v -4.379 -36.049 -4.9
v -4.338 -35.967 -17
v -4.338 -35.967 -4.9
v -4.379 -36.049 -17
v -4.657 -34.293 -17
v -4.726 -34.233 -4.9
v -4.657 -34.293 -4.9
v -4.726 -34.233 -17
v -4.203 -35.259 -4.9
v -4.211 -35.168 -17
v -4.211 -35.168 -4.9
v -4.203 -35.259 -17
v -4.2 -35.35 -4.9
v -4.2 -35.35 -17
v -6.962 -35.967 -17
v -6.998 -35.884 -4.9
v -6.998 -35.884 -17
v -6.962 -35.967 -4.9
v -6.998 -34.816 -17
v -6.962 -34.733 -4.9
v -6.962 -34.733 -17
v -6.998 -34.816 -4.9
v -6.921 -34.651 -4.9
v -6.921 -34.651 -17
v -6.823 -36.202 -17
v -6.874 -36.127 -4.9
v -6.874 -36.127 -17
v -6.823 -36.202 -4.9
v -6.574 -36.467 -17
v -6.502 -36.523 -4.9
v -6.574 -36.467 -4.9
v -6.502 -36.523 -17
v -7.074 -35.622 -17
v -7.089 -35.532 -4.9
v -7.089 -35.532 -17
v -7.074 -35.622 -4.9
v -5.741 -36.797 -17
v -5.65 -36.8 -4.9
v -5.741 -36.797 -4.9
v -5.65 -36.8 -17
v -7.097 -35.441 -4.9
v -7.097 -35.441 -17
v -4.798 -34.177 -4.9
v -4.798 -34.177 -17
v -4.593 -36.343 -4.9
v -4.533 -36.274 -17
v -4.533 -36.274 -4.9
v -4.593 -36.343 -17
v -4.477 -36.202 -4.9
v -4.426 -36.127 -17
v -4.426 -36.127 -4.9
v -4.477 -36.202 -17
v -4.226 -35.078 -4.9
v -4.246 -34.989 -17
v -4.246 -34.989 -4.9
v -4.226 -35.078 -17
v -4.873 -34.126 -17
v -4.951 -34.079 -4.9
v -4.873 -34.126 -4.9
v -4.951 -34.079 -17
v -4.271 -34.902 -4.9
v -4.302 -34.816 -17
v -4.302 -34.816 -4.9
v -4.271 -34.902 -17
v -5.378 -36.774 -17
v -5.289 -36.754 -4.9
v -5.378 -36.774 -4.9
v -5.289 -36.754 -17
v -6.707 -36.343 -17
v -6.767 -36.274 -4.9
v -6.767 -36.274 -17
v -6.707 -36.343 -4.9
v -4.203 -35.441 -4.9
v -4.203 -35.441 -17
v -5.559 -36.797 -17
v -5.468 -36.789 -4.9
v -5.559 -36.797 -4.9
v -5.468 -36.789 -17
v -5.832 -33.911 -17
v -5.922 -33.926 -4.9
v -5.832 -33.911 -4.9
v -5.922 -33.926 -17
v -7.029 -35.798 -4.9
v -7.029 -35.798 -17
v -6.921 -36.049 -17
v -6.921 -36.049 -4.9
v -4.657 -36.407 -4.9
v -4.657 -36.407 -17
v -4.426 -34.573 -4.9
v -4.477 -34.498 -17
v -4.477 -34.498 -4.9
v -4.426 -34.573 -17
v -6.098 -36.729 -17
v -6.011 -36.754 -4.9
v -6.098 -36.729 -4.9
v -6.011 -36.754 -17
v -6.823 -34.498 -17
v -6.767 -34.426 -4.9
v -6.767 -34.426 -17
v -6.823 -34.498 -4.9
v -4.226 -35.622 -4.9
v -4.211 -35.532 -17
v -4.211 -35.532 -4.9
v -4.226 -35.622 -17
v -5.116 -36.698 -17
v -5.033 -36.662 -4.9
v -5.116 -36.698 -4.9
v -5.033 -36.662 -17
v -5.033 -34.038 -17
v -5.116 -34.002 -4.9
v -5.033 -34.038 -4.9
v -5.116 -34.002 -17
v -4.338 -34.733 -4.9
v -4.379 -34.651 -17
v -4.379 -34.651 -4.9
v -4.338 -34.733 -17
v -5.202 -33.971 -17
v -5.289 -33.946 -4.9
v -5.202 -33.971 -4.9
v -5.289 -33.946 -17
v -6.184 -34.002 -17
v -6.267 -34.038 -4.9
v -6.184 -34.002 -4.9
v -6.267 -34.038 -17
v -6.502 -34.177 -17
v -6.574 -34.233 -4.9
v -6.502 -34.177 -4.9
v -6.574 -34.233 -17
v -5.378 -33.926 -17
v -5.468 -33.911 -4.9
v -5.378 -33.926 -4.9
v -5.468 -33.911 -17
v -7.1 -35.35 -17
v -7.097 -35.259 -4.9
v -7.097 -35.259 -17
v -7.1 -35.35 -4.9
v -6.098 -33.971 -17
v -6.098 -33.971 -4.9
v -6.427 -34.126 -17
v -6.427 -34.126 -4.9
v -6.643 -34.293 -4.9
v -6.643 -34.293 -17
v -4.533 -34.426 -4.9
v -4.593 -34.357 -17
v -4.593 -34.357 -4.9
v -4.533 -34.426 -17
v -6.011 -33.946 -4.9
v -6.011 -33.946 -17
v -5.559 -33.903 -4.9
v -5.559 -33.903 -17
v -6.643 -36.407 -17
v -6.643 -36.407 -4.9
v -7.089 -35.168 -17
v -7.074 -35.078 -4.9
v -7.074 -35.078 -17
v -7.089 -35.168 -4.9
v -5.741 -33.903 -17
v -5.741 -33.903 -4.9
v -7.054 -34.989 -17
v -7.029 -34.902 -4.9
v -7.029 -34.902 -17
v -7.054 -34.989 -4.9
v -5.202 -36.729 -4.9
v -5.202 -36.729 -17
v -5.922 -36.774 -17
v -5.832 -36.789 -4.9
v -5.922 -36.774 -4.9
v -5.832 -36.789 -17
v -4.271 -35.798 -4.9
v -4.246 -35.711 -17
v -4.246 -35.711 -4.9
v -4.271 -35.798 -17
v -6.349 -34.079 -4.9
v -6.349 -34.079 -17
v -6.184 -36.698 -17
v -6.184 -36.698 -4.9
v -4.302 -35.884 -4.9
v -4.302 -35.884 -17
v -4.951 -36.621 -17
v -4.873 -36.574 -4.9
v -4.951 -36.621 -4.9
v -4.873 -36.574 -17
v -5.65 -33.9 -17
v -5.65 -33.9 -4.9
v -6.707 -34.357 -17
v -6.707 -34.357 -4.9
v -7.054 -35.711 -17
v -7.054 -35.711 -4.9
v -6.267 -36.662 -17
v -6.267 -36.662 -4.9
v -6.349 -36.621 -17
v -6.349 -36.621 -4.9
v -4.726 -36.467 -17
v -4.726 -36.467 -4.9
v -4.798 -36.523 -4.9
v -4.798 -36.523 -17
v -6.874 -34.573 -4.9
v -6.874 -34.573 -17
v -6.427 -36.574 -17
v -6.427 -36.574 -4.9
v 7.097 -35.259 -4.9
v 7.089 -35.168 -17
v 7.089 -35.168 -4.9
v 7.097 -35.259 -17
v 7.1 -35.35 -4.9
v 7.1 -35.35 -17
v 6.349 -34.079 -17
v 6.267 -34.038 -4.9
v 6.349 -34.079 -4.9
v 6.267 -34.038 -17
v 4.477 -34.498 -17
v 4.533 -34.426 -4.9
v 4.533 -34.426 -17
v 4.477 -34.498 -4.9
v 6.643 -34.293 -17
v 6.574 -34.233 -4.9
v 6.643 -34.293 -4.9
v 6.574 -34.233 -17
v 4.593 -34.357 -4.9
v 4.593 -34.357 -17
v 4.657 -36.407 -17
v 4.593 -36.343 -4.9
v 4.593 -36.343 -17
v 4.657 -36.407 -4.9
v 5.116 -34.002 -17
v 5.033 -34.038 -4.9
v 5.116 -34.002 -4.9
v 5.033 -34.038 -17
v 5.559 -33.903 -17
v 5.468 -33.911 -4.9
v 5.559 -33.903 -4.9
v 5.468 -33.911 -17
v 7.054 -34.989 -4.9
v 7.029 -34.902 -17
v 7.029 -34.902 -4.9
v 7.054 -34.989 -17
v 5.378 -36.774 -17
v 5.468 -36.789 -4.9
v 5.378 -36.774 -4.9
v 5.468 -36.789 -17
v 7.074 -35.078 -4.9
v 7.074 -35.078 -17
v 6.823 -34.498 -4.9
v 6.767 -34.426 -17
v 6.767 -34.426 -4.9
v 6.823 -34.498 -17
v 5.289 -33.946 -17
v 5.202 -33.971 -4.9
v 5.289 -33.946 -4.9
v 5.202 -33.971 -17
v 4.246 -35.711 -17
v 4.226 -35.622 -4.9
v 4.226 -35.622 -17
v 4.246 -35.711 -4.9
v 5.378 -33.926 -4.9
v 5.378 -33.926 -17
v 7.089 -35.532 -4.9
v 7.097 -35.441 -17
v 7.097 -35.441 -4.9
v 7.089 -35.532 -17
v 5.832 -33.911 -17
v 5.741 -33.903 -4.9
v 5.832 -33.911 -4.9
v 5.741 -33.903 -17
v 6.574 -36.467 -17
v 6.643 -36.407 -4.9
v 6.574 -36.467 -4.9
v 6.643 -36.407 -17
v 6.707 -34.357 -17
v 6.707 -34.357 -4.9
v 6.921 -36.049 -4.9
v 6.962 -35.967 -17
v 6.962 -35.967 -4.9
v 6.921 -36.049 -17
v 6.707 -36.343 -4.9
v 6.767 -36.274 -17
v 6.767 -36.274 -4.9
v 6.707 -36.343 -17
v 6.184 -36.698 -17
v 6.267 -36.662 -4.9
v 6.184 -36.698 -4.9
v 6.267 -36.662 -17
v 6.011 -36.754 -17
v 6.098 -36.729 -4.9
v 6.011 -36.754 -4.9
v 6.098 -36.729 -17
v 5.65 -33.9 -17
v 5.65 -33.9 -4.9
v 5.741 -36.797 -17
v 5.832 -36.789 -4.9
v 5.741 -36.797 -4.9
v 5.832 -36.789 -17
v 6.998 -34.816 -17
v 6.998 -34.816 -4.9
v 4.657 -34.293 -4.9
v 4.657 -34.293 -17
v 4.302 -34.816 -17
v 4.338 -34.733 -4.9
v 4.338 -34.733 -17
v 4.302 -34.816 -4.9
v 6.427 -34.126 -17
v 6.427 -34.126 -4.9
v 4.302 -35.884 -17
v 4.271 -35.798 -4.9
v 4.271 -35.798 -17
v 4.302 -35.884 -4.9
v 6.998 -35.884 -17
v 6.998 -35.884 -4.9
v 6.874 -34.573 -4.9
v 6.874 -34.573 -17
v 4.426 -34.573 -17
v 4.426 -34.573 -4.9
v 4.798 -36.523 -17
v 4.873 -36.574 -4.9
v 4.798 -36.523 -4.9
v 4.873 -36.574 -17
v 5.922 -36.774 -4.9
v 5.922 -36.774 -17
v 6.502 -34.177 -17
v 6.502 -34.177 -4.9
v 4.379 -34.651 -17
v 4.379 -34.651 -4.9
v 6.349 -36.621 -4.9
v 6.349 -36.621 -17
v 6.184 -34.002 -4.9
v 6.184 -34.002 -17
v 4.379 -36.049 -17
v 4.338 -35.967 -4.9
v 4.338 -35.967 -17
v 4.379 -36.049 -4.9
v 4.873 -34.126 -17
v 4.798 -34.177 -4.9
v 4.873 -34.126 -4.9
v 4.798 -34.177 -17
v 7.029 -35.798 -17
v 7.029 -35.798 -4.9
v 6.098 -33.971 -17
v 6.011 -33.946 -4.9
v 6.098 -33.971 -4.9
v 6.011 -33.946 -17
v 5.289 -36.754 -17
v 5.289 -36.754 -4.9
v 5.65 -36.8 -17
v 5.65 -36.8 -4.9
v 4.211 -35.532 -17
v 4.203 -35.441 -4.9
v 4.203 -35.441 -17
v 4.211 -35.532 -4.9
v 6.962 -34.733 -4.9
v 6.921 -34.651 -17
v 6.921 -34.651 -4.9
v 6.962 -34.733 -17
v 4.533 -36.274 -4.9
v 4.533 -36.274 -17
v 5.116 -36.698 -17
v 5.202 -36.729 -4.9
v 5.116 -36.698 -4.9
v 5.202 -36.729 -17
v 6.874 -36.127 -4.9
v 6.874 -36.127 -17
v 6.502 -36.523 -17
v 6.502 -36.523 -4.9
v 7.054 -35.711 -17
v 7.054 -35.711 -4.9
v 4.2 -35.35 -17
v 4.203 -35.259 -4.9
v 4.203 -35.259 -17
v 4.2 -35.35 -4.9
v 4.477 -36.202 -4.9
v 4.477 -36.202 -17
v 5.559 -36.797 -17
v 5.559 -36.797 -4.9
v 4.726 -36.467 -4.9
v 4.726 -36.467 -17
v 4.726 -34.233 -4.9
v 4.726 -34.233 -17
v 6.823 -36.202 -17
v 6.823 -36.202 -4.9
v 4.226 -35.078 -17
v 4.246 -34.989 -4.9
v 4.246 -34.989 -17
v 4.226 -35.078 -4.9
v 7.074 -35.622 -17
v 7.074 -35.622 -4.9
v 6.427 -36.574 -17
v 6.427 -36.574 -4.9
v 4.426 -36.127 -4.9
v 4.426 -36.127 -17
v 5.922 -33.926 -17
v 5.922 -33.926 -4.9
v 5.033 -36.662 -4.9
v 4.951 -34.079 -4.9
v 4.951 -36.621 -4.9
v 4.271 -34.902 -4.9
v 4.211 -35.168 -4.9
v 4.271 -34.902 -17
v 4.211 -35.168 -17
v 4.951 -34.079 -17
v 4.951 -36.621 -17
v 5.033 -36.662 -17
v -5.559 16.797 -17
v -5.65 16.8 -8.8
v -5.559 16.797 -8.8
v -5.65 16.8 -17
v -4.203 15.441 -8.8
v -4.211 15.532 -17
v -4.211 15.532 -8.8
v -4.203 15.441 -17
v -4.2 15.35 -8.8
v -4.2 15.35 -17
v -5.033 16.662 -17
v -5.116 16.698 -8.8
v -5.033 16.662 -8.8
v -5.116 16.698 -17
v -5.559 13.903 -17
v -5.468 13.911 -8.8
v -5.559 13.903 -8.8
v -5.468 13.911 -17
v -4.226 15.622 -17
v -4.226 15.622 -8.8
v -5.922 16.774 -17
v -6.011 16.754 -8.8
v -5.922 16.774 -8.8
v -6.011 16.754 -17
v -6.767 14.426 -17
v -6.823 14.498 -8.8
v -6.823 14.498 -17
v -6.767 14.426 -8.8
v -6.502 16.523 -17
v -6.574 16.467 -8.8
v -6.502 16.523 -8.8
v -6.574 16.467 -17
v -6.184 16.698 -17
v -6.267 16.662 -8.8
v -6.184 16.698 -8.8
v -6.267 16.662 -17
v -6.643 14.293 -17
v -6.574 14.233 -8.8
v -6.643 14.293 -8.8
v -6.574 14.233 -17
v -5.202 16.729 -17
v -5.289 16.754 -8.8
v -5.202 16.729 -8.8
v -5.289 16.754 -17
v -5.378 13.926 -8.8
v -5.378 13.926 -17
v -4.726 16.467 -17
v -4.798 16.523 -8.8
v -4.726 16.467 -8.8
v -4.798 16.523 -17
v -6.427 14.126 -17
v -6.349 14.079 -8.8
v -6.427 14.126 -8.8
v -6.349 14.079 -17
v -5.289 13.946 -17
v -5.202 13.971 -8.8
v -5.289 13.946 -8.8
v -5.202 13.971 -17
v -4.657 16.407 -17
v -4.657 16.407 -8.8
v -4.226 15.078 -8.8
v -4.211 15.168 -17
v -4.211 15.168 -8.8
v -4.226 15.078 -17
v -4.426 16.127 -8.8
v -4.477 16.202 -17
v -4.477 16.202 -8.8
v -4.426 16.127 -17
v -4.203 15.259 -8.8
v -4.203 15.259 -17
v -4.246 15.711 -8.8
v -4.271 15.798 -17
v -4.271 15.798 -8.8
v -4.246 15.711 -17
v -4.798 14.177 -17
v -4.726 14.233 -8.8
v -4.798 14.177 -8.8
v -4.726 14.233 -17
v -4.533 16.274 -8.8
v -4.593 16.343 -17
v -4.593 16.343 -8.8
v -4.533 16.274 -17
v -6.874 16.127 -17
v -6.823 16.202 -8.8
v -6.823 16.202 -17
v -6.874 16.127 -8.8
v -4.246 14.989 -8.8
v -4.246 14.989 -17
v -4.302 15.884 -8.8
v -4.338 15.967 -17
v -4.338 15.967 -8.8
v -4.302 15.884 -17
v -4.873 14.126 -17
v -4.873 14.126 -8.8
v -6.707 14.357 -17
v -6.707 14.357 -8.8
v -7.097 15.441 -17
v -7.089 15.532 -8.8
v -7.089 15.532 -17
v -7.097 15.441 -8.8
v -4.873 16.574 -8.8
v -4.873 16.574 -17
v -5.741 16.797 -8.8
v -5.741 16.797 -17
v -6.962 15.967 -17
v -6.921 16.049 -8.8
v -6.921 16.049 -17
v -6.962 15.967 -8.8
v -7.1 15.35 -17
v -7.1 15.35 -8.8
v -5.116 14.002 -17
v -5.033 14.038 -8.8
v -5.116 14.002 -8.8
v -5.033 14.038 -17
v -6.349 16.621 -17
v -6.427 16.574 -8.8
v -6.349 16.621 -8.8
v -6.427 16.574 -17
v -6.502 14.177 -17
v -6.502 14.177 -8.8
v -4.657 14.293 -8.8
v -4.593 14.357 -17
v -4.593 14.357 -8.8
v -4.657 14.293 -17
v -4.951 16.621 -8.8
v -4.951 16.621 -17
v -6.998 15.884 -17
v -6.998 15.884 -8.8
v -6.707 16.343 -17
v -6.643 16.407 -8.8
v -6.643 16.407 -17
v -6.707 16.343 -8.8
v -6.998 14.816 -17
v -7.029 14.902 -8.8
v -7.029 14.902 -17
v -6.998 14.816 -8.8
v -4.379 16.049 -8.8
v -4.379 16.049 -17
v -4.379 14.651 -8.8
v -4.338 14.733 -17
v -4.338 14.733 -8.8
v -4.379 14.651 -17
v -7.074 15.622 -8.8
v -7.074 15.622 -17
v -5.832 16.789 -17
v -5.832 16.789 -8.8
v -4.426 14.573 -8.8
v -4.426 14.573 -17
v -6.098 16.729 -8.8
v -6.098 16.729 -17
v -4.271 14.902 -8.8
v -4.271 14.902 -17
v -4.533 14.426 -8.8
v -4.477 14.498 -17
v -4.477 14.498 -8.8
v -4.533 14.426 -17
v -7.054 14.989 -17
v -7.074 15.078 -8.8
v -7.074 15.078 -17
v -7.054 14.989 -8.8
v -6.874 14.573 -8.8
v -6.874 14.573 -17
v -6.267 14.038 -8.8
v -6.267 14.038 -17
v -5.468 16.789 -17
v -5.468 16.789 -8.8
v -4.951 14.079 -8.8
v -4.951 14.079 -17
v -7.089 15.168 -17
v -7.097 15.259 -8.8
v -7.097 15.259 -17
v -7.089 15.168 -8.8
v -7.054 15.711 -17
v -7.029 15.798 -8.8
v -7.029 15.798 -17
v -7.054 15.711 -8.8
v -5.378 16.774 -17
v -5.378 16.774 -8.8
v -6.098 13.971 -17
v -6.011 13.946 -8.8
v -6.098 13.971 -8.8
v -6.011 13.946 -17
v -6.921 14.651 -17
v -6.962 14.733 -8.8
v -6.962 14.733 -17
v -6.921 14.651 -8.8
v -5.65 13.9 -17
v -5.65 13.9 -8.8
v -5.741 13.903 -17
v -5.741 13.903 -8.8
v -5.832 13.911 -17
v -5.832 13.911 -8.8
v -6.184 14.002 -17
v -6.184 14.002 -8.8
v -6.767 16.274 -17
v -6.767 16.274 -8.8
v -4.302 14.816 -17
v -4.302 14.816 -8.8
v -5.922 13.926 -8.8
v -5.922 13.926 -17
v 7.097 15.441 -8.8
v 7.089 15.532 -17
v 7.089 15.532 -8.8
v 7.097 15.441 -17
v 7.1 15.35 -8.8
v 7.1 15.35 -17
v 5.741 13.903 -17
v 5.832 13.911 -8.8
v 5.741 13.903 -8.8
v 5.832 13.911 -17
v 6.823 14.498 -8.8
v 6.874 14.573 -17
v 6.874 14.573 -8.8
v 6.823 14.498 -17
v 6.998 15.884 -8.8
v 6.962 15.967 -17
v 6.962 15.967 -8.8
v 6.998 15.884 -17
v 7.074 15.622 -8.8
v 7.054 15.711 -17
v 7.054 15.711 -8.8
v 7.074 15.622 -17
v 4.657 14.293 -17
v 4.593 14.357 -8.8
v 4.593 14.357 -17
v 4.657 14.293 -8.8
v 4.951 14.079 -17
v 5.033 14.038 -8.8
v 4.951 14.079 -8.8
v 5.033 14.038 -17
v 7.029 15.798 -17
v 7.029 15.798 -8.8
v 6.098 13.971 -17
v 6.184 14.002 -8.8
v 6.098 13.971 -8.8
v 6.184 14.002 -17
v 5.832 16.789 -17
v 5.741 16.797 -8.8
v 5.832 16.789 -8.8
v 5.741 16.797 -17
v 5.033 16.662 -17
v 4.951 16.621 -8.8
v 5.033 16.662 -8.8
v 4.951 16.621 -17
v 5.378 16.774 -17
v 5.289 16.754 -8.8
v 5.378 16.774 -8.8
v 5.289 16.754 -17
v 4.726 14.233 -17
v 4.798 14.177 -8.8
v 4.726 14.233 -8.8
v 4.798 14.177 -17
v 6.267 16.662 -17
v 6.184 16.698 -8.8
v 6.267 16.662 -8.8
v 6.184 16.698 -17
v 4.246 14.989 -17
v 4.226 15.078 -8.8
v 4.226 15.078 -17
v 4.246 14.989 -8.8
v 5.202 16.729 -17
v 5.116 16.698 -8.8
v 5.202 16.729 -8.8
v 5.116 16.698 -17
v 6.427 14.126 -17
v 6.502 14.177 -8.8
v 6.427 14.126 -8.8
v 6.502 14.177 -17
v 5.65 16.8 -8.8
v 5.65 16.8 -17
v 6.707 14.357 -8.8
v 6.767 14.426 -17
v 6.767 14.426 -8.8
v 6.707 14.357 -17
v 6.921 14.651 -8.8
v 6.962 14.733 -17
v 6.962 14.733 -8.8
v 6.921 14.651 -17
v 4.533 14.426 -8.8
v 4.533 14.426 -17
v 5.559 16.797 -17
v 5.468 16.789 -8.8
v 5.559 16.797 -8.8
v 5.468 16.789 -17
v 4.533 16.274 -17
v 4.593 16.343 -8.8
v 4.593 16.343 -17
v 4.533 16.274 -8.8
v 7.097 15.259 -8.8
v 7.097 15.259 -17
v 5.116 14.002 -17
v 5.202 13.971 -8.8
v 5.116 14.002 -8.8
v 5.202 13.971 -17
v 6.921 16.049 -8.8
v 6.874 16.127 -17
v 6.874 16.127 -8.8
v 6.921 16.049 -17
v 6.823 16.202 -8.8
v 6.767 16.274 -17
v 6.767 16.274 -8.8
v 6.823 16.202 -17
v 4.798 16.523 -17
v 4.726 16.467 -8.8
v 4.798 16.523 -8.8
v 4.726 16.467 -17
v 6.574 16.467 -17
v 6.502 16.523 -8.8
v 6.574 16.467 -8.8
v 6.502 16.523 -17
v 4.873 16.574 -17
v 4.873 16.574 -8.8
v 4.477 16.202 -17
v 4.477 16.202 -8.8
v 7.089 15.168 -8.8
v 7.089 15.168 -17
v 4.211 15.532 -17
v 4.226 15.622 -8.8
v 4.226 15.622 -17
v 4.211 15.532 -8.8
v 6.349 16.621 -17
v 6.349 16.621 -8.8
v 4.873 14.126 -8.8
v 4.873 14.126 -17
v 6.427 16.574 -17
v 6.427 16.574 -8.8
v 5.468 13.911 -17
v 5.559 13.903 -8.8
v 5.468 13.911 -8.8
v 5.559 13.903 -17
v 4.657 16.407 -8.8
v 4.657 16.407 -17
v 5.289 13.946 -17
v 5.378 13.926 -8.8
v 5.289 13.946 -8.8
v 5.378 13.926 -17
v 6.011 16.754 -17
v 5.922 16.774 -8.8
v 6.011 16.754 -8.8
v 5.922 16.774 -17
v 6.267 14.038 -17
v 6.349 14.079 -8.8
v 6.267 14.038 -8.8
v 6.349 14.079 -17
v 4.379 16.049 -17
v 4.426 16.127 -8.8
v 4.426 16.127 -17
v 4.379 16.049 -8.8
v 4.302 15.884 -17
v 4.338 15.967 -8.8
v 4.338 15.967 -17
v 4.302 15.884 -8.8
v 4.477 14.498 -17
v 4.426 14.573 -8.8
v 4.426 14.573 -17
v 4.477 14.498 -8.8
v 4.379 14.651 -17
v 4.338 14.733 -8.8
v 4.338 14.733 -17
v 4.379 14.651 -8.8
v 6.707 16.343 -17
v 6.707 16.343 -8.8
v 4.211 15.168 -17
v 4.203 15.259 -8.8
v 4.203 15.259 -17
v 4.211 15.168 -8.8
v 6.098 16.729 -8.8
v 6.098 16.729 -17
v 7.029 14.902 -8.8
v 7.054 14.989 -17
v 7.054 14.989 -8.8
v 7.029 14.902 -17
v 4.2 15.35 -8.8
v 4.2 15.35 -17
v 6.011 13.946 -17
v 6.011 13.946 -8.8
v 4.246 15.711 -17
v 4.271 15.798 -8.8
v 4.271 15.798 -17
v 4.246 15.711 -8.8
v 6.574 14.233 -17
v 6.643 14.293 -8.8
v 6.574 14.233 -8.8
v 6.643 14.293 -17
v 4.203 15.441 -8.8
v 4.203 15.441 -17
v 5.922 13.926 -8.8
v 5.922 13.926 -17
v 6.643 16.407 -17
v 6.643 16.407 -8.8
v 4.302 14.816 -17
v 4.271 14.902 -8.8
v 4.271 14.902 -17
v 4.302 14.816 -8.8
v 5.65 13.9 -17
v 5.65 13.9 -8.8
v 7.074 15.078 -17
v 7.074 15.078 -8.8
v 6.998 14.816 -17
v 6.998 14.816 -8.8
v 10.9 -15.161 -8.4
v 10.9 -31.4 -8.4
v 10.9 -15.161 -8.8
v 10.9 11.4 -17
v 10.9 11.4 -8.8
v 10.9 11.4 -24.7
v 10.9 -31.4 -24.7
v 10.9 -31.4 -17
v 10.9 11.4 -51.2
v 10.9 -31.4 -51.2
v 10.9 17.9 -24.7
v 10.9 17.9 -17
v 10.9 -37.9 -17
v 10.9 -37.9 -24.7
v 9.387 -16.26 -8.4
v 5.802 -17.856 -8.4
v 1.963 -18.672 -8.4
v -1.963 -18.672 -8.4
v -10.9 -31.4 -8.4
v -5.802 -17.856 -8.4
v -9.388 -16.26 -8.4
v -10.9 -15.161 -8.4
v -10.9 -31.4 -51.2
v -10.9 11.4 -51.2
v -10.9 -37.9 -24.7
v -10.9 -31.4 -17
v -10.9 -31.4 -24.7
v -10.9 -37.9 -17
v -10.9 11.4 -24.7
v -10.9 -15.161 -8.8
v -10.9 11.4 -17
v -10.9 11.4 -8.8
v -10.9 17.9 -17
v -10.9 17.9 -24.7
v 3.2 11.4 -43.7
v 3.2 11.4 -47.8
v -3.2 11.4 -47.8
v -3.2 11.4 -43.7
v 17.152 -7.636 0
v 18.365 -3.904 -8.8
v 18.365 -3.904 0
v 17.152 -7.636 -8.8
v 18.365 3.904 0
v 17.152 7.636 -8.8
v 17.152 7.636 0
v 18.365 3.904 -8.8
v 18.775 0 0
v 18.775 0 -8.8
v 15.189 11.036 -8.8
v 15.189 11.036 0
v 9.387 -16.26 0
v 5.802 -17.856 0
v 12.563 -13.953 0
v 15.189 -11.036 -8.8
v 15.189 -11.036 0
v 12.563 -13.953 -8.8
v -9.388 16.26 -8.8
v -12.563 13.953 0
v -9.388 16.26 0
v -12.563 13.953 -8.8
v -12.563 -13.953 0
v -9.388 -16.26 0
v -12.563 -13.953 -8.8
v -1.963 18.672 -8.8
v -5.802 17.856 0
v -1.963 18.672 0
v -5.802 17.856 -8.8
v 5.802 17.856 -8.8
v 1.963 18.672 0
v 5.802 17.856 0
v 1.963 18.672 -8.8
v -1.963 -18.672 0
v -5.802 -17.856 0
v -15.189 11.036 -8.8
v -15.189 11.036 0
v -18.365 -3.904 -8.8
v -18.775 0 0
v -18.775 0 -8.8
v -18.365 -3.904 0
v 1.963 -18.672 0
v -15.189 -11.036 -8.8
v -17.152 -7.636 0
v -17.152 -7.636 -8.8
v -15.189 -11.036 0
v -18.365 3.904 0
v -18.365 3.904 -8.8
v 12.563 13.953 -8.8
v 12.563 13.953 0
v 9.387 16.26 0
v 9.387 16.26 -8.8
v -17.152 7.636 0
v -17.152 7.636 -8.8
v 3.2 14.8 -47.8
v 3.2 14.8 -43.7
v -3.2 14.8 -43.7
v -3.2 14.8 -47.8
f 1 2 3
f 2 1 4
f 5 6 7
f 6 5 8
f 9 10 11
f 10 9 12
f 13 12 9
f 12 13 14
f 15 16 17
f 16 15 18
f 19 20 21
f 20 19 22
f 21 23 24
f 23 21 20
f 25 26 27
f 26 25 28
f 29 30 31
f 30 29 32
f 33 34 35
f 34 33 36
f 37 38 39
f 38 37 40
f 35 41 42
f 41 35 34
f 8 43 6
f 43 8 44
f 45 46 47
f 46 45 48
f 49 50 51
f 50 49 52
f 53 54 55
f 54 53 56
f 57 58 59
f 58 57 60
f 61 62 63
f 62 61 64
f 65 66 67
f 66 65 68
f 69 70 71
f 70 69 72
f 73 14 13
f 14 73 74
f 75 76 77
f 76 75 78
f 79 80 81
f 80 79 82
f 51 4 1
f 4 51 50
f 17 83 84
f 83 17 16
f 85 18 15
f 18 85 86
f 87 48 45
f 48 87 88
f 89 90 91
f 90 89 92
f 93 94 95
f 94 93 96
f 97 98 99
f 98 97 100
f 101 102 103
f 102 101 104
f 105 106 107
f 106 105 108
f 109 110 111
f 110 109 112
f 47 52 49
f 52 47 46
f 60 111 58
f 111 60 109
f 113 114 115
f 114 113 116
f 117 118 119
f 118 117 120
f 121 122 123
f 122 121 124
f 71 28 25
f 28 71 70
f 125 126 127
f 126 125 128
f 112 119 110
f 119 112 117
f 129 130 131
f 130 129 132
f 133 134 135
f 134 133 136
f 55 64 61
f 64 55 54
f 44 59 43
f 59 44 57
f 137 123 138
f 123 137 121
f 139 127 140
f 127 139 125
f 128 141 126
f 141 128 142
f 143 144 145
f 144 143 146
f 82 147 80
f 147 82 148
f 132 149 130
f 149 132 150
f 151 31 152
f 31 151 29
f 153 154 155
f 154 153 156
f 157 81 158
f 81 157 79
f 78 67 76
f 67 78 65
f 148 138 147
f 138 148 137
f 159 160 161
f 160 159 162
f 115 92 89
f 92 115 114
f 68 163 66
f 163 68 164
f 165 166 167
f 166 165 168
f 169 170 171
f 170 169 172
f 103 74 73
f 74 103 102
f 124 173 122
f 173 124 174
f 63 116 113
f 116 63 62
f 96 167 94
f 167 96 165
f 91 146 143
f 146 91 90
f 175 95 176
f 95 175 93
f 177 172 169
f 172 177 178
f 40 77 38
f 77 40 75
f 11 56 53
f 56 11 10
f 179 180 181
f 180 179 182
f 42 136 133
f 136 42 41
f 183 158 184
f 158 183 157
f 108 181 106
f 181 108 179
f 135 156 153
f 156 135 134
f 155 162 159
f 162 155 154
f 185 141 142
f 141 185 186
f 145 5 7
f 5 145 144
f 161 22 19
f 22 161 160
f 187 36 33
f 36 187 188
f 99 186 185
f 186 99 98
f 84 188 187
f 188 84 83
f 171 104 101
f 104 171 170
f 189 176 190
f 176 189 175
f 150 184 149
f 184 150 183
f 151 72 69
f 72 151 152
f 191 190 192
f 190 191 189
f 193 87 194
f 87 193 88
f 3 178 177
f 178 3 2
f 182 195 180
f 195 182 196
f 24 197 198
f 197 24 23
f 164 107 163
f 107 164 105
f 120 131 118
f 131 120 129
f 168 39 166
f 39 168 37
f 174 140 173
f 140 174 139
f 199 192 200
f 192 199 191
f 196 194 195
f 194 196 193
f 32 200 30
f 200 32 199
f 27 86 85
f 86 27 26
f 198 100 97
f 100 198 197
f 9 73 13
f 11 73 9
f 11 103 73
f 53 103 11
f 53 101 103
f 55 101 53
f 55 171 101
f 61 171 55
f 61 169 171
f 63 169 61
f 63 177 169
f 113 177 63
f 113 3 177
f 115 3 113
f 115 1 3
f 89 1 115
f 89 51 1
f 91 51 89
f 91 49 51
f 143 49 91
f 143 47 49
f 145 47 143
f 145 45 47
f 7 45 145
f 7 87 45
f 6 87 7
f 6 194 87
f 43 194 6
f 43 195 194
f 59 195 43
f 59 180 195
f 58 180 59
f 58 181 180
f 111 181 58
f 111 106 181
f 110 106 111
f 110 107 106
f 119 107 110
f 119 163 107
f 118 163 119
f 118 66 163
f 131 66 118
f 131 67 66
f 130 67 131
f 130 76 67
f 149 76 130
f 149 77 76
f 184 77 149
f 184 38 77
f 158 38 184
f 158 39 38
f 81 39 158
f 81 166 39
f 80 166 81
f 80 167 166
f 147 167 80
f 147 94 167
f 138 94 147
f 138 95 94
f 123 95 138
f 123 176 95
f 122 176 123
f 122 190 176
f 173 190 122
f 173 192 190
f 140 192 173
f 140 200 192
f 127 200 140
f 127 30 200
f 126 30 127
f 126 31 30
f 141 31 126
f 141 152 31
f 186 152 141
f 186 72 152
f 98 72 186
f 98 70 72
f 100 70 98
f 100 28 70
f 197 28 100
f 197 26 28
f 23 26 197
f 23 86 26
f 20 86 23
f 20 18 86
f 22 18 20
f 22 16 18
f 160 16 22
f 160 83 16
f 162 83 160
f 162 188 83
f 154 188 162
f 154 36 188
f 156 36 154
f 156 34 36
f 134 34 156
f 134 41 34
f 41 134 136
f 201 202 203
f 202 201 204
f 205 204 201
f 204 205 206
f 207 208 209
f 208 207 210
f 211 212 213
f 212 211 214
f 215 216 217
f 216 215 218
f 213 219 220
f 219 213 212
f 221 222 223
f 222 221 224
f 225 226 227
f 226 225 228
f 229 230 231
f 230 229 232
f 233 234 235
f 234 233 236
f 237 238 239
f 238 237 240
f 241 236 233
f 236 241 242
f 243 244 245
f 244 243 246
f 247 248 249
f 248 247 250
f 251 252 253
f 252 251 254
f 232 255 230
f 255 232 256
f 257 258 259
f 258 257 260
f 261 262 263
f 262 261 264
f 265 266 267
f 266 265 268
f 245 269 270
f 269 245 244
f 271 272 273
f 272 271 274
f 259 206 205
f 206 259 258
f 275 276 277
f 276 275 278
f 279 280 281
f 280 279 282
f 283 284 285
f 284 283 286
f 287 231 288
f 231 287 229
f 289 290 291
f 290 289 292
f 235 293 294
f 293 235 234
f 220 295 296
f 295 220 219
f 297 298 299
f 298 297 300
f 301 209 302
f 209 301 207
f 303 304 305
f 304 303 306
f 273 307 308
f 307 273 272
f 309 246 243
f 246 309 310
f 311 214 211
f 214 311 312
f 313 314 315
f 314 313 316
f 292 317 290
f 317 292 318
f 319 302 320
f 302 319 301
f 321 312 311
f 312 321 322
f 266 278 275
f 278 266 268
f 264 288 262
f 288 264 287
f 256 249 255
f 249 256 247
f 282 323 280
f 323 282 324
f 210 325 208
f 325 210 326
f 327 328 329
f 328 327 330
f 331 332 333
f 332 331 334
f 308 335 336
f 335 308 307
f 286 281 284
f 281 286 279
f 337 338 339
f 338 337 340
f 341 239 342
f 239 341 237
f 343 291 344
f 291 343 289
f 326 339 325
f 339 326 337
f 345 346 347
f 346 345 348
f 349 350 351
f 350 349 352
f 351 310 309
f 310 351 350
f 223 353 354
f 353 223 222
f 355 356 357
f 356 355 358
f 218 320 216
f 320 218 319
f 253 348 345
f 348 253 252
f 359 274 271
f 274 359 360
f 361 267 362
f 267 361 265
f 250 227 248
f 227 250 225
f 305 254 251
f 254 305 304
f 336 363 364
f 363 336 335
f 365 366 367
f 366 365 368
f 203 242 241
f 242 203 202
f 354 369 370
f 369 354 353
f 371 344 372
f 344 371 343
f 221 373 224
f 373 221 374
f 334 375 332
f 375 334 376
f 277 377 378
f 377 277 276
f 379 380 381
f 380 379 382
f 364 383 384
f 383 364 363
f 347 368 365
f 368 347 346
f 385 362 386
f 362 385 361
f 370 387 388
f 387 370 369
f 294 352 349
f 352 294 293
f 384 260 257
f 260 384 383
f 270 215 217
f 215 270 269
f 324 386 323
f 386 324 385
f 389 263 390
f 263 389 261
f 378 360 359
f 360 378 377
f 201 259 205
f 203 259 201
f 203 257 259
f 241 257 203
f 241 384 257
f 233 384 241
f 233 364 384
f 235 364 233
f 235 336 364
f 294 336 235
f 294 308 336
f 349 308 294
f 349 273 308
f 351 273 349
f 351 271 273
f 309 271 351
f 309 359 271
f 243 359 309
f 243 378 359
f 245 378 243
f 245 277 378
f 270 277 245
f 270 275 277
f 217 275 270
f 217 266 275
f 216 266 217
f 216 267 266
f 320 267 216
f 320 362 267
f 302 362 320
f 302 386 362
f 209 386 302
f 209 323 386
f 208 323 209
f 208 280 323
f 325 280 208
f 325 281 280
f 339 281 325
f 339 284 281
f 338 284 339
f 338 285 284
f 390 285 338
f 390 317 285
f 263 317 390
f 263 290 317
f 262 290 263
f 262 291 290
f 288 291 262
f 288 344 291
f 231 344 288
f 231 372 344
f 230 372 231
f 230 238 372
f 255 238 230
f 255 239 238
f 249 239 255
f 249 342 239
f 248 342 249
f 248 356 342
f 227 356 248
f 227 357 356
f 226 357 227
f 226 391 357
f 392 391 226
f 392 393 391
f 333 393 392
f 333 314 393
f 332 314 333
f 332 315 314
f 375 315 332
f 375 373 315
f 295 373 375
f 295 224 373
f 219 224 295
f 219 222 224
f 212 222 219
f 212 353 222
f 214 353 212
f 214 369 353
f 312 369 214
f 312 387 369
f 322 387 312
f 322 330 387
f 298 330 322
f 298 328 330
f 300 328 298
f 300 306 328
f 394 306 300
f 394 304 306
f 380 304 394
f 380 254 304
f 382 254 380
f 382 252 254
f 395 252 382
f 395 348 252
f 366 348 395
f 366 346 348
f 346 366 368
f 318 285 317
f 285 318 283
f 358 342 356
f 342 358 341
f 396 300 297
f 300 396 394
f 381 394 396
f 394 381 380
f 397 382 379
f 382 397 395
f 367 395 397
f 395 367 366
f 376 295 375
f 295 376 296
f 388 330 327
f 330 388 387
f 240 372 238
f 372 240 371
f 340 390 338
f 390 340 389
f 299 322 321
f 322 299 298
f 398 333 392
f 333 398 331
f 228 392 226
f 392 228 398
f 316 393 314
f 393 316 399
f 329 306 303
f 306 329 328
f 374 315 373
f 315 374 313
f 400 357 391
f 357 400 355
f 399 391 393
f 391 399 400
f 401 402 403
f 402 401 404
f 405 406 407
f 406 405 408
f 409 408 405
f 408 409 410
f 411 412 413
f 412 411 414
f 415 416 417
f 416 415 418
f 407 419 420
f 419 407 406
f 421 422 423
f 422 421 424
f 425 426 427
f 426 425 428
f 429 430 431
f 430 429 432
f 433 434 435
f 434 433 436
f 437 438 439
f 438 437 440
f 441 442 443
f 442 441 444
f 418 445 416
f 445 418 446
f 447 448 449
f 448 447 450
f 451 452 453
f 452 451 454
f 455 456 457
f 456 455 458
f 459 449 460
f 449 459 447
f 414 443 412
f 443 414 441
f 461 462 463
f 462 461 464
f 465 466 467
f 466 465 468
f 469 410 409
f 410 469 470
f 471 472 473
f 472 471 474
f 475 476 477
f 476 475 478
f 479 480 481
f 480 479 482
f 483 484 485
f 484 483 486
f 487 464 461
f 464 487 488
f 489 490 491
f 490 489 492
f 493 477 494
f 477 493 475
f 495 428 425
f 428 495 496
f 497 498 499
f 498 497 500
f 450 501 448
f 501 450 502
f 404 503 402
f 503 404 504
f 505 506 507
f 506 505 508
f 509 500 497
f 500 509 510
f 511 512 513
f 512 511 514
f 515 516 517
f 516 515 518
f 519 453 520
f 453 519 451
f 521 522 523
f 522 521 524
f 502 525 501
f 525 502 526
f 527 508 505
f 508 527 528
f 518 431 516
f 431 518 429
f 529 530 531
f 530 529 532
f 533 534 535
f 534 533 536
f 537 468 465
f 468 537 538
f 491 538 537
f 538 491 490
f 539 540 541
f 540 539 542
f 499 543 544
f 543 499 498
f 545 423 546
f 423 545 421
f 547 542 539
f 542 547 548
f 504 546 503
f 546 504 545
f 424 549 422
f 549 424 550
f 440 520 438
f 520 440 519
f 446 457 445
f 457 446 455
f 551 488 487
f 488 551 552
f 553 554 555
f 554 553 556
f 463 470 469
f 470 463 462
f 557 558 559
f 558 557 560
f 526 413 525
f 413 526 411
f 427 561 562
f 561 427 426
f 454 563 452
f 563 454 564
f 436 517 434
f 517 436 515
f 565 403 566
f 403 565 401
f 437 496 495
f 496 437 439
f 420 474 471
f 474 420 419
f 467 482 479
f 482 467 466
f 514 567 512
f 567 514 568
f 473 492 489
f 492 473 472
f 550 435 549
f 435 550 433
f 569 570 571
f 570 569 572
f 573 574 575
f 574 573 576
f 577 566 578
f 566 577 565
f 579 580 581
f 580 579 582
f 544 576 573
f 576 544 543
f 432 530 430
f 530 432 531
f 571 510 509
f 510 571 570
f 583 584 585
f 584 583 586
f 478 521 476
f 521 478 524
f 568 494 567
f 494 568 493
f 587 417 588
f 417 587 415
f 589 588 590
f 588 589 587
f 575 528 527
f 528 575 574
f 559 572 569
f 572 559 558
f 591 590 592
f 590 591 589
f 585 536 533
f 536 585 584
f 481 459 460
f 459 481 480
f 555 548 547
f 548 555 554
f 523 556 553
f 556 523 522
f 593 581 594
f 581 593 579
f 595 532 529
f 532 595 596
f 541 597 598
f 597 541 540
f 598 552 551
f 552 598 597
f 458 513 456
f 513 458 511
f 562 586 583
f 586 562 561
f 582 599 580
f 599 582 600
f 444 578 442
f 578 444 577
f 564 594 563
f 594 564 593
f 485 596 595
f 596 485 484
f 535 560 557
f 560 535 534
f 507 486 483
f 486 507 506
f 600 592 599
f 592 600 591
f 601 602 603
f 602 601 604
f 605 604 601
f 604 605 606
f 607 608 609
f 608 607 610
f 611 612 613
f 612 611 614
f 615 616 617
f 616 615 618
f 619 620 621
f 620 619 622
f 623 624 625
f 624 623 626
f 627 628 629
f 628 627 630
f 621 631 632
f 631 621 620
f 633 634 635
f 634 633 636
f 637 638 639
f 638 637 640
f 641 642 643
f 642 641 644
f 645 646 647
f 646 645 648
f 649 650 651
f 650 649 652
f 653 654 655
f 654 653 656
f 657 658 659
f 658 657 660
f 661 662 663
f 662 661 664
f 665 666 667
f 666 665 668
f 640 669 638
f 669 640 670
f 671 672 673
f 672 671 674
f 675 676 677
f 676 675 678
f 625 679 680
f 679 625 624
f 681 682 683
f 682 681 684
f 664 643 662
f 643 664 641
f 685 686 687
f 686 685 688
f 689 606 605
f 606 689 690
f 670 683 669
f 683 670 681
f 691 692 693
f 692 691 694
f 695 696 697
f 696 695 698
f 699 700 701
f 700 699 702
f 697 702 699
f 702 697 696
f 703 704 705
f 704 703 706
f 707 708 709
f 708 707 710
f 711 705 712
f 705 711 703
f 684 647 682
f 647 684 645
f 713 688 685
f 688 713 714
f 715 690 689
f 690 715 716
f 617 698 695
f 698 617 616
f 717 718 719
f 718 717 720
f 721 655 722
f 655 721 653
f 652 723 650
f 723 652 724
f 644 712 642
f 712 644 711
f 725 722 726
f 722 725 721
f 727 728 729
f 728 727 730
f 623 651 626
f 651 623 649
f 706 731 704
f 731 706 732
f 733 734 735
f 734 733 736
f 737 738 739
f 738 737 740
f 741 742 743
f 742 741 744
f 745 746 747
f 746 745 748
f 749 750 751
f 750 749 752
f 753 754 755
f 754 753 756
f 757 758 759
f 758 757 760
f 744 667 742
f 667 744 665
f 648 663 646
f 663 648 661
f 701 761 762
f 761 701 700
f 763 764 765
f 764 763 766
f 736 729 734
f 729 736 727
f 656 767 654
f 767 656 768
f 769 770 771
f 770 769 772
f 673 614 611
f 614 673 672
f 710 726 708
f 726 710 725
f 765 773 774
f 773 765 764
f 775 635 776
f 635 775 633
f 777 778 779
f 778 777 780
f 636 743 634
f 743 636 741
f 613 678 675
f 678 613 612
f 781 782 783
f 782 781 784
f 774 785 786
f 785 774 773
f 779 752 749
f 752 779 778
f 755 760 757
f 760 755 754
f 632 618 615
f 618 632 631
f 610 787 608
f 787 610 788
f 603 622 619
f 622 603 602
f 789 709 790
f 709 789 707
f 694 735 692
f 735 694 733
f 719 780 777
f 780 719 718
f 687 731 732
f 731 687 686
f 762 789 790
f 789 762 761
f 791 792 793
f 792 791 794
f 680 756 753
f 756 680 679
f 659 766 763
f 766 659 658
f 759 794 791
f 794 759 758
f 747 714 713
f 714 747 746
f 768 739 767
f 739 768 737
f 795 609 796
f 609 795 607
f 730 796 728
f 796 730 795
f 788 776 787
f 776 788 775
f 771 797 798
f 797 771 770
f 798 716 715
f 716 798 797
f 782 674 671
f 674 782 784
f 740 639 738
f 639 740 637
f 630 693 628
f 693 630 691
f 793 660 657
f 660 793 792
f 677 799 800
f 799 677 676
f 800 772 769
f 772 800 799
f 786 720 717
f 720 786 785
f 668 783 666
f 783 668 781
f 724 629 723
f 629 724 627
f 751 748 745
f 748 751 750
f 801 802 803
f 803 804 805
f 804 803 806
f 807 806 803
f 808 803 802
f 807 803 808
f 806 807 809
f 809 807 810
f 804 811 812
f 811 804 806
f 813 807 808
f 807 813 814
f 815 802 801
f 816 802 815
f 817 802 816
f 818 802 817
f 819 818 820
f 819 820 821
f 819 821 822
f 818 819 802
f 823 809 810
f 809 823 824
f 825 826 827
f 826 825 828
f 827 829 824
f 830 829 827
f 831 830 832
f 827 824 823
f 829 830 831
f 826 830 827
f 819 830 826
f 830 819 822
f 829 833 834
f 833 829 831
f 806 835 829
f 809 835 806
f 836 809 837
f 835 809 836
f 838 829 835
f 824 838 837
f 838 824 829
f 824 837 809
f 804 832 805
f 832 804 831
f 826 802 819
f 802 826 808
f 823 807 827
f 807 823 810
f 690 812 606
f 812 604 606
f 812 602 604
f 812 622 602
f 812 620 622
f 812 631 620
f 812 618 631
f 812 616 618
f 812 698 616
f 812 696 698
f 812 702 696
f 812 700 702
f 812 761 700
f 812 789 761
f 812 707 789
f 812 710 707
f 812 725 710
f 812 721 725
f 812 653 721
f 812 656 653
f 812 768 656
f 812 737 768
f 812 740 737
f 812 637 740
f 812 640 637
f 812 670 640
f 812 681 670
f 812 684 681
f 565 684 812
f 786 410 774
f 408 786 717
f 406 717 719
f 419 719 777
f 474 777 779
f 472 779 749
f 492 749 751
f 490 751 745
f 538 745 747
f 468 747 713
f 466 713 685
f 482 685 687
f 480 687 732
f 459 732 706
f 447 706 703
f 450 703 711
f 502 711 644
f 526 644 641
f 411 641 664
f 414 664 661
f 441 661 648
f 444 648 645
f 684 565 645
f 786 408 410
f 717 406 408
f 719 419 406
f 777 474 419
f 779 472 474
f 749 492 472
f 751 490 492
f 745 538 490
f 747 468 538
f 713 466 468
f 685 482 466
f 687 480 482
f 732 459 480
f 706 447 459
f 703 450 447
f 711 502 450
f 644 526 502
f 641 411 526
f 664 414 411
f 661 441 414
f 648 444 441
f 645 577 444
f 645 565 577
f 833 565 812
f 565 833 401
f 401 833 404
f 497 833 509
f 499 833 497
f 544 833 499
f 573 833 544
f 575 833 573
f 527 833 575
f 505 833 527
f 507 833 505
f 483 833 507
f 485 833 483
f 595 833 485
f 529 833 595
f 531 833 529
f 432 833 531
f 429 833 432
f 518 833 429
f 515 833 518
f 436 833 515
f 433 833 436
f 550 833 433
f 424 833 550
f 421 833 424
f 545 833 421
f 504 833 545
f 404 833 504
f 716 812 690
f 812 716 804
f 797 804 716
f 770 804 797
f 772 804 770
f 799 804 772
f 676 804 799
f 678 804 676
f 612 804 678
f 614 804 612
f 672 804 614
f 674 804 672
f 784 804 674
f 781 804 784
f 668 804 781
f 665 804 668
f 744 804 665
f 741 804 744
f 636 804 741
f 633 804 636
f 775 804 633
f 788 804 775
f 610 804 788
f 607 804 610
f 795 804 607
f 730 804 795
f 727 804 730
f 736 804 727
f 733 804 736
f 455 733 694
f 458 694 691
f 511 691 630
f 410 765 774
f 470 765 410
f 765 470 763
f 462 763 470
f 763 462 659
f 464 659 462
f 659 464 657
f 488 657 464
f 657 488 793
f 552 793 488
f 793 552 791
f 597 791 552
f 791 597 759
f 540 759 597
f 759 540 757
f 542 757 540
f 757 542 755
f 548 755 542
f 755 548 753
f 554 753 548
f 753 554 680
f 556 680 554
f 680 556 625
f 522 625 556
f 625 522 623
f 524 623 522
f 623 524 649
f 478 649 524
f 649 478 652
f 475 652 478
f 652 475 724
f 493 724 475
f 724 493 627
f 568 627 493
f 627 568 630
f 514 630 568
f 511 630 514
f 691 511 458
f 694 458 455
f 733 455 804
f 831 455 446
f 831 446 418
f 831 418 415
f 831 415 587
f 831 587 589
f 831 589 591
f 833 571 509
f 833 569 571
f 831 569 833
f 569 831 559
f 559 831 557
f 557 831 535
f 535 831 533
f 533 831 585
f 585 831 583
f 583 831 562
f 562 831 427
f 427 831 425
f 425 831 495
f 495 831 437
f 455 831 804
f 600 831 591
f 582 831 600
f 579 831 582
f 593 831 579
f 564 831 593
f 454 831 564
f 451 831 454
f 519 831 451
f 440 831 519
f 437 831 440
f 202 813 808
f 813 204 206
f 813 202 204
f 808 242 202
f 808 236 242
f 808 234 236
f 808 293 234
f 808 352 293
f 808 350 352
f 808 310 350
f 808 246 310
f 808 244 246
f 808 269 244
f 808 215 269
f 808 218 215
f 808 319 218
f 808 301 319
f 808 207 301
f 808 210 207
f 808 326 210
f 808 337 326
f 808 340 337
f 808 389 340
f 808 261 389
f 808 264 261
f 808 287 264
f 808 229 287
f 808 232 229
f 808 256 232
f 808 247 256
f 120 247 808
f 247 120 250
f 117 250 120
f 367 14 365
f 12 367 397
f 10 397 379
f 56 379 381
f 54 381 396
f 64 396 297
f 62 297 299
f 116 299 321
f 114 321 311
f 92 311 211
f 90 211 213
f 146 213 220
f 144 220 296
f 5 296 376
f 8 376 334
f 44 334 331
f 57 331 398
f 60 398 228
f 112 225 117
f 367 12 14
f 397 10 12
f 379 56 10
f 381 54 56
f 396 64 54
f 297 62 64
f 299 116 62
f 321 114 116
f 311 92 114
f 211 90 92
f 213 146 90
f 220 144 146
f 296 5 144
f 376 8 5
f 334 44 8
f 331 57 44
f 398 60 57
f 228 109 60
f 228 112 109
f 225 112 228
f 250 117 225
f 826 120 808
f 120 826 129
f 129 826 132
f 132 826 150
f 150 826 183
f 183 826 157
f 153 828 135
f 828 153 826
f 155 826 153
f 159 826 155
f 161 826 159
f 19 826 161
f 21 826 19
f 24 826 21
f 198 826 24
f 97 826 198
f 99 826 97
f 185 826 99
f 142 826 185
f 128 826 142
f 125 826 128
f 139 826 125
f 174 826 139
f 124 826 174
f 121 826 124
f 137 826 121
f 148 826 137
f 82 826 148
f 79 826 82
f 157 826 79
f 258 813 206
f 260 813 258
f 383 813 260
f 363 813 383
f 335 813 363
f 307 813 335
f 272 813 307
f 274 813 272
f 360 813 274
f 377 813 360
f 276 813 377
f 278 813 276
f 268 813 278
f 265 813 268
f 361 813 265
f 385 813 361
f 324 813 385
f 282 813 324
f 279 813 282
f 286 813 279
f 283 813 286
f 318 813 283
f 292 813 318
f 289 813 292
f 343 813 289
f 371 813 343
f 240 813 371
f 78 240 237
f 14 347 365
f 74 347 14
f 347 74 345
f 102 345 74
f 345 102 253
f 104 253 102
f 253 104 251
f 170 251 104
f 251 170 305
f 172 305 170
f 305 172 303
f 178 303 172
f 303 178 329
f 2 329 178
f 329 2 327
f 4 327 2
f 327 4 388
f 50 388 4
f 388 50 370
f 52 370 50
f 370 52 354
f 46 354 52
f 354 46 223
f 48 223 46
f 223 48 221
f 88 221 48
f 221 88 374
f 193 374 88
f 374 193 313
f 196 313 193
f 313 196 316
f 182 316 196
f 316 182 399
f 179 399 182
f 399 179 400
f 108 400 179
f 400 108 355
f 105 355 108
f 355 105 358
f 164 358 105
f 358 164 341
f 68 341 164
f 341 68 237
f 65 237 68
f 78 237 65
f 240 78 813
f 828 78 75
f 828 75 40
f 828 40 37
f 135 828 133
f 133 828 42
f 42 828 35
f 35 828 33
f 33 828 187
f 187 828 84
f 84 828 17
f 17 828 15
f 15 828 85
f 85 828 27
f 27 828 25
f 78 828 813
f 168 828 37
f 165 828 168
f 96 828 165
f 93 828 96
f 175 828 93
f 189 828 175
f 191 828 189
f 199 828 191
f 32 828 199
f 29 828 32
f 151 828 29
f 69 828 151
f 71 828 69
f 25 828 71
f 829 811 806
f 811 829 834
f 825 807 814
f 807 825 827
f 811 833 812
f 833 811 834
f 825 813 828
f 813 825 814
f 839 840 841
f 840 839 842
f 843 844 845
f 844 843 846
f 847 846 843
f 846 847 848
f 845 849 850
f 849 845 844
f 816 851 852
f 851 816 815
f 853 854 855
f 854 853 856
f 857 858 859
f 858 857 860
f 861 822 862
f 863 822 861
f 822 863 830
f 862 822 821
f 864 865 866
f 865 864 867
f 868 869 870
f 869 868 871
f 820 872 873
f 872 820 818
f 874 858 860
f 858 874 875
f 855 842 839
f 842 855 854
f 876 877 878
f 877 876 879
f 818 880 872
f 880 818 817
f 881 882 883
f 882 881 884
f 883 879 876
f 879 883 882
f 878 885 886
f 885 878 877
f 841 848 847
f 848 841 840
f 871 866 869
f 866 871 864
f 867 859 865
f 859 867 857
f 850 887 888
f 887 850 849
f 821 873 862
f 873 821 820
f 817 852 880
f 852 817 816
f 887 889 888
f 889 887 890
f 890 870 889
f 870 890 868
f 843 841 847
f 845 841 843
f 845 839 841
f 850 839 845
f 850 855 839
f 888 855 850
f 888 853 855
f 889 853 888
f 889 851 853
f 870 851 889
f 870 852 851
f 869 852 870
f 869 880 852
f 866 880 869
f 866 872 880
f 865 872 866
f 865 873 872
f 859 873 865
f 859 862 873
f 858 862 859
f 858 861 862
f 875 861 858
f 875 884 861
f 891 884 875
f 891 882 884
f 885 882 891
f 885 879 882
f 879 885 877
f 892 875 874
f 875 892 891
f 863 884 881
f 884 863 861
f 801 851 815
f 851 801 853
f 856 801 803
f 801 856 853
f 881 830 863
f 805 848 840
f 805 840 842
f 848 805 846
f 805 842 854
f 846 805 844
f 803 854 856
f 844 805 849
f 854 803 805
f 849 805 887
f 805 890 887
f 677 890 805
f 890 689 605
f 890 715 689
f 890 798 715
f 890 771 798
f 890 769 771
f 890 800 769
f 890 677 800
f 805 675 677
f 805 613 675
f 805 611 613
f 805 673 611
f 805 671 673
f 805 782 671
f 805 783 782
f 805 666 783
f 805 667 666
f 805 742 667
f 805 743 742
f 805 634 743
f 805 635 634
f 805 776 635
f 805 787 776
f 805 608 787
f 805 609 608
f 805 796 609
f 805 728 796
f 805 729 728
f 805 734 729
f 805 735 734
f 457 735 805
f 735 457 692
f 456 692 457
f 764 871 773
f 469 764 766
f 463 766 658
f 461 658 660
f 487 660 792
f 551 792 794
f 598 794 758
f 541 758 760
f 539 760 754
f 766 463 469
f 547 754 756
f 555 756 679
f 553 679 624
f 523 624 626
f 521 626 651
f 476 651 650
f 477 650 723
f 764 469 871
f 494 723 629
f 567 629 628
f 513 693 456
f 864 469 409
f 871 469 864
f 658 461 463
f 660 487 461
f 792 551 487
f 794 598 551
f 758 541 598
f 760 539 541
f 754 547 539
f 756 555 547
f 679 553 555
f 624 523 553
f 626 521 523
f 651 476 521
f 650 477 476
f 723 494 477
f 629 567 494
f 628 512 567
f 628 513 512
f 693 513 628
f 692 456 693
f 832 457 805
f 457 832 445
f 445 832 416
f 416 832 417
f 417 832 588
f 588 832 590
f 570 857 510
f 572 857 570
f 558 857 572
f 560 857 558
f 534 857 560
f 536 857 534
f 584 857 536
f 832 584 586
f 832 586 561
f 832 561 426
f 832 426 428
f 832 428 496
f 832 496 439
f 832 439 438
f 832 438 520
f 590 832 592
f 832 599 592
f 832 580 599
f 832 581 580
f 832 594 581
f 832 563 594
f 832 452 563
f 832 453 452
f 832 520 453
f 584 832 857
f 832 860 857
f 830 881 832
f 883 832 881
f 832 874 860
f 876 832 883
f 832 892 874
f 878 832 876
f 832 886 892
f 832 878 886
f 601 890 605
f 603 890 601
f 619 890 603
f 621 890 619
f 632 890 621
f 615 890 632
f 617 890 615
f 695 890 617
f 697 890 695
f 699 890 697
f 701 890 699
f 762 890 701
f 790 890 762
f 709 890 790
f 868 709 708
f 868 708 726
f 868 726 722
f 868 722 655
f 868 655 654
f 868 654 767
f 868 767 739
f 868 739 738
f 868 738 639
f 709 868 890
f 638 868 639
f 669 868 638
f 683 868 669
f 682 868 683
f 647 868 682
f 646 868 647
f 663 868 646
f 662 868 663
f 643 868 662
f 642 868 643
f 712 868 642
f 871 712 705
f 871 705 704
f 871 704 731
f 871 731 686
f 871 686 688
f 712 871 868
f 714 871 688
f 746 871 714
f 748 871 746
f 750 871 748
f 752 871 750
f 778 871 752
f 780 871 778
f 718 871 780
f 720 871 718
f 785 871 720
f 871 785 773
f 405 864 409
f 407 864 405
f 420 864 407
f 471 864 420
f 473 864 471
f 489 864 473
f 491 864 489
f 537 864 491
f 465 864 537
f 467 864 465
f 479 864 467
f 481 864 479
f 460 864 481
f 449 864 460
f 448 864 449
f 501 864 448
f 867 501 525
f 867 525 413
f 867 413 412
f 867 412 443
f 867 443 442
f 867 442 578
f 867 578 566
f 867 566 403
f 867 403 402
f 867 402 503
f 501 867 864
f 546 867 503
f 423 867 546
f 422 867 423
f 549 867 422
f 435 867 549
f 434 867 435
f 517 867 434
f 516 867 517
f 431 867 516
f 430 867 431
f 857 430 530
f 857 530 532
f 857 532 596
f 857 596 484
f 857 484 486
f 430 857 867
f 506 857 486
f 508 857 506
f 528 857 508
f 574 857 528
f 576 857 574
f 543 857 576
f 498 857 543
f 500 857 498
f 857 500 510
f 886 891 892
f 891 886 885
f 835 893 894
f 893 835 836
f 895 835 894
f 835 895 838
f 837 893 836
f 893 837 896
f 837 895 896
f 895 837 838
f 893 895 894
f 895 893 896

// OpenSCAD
// When calling this module, use toleranceMotor(boolean,boolean,boolean, number); 
// The first boolean determines the bolt direction(true is up, false is down) and 
// the second determines where the module is centered (true centers at the hub, 
// false centers at the motor mount).
// the third boolean determines whether to use the large cylindrical hub or the 
// small metal nub. 
// The Fourth number indicated the tolerance of the motor (default is .4 mm)

//THIS IS FOR IF YOU USE OTHER KINDS OF MOTORS, MOTOROUTCROP IS THE DISTANCE FROM THE MOUNTING PLATE TO THE BUISNESS END OF YOUR MOTOR, IF YOU EVER NEED TO SWITCH TO ANOTHER JUST CHANGE THIS VALUE TO THE ACTUAL VALUE

function mm(i) = i*24.5;

function StandardServoHeightAbvWings(tolerance=.6)=(StandardServoHeight()-(StandardServoWingsHeight()+StandardServoWingsDist()+tolerance*2));


function StandardServoOutcrop()= StandardServoCylinderHeight()+StandardServoHeightAbvWings();

function StandardServoWingLength()= (StandardServoLength()-StandardServoBaseLength())/2;


//for use when the motor is incorporated into parts
	//this is distance, the short way, from the edge of the motor to the center of the hub
function StandardServoCenterDist()=(StandardServoCylinderDiam()/2) + ((StandardServoLength()-StandardServoBaseLength())/2-StandardServoTolerance()*2); 

//basic motor shape
function StandardServoHeight()=42;
function StandardServoBaseLength()=42;
function StandardServoThickness()=21;

//wings for mounting
function StandardServoWingsHeight()=5.5;
function StandardServoLength()=55;
function StandardServoWingsDist()=26.5;
function StandardServoBoltHeadHeight()=1.4;

//cylinder on top of motor
function StandardServoCylinderHeight()=(46-38);
function StandardServoCylinderDiam()=21;
function StandardServoCylinderDist()=31;

//nub on top of motor
function StandardServoNubHeight()=5.85;
function StandardServoNubDiam(3dPrinterTolerance=.4)=6+3dPrinterTolerance;

//all bolts
function StandardServoBoltHeight()=13.5;
function StandardServoBoltDiam()=2.5;

//body bolts
function StandardServoBoltSideDist()=4.35;
function StandardServoBoltEdgeDist()=4.85;

//cylinder bolts
function StandardServoCylBoltDist()=7.62;

//hub for wires
function StandardServoHubHeight()=3.7;
function StandardServoHubWidth()=6;
function StandardServoHubLength()=3;
function StandardServoHubDist()=3;

//tolerance for servo
function StandardServoTolerance()=.6;

//When calling this module, use StandardServoMotor(boolean,boolean); The first boolean determines the bolt direction(true is up, false is down) and the second determines where the module is centered (true centers at the hub, false centers at the motor mount)

//defining a bolt
module StandardServoBolt(ServoTolerance=StandardServoTolerance())
{
	cylinder(h=StandardServoBoltHeight()+ServoTolerance, r=(StandardServoBoltDiam()+ServoTolerance)/2, $fn=100);
}

module bodyBolts(boltPlacementZ,ServoTolerance=StandardServoTolerance())
{
		translate([StandardServoBoltEdgeDist(),-StandardServoBoltSideDist(),boltPlacementZ])
		{
			StandardServoBolt(ServoTolerance);
		}
		
		translate([(StandardServoThickness()-StandardServoBoltEdgeDist()),-StandardServoBoltSideDist(),boltPlacementZ])
		{
			StandardServoBolt(ServoTolerance);
		}

		translate([StandardServoBoltEdgeDist(),(StandardServoBaseLength()+StandardServoBoltSideDist()),boltPlacementZ])
		{
			StandardServoBolt(ServoTolerance);
		}
		
		translate([(StandardServoThickness()-StandardServoBoltEdgeDist()),(StandardServoBaseLength()+StandardServoBoltSideDist()),boltPlacementZ])
		{
			StandardServoBolt(ServoTolerance);
		}
}

module StandardServoBlock(boltsUp=true, Cylinder=1, ServoTolerance=StandardServoTolerance()){
	union()
	{
//basic motor shape
		translate([-ServoTolerance, -ServoTolerance, -ServoTolerance])
		{
			cube([StandardServoThickness()+ServoTolerance*2, StandardServoBaseLength()+ServoTolerance*2, StandardServoHeight()+ServoTolerance*2]);
		}

//wings for mounting
		translate([-ServoTolerance, (-ServoTolerance+((StandardServoBaseLength()-StandardServoLength())/2)), StandardServoWingsDist()-ServoTolerance])
		{
			cube([StandardServoThickness()+ServoTolerance*2, StandardServoLength()+ServoTolerance*2, StandardServoWingsHeight()+ServoTolerance*2+StandardServoBoltHeadHeight()]);
		}

//determines if you should make the cylinder or a nub
if(Cylinder==1){
//cylinder on top of motor
		translate([StandardServoCylinderDiam()/2,StandardServoCylinderDist(),StandardServoHeight()])
		{
			cylinder(StandardServoCylinderHeight()+ServoTolerance*2, mm(1.5)/2+ServoTolerance, mm(1.5)/2+ServoTolerance, 0);

		}

}else{
	if(Cylinder==2){
//nub on top of motor
		translate([StandardServoCylinderDiam()/2,StandardServoCylinderDist(),StandardServoHeight()])
		{
			cylinder(StandardServoNubHeight()+ServoTolerance*2, StandardServoNubDiam()/2+ServoTolerance, StandardServoNubDiam()/2+ServoTolerance, 0);

		}
}else{
	if(Cylinder==3){
	union()
	{
		translate([StandardServoCylinderDiam()/2,StandardServoCylinderDist(),StandardServoHeight()])
		{
			cylinder(StandardServoNubHeight()+ServoTolerance*2, StandardServoNubDiam()/2+ServoTolerance, StandardServoNubDiam()/2+ServoTolerance, 0);

		}

		translate([StandardServoThickness()/2+StandardServoTolerance(),StandardServoCylinderDist(),StandardServoHeight()+StandardServoNubHeight()+ServoTolerance*6])
		{
			Servo_wheel_4_arm_horn();
		}
	}
}
}	
}

		if(boltsUp==true){
			bodyBolts(StandardServoWingsDist()+StandardServoWingsHeight(),ServoTolerance);
		}else{
			bodyBolts(StandardServoWingsDist()-StandardServoBoltHeight(),ServoTolerance);
		}
		
//hub for wires
		translate([(StandardServoThickness()-(StandardServoHubWidth()+ServoTolerance))/2,(StandardServoBaseLength()+ServoTolerance),StandardServoHubDist()])
		{
			cube([StandardServoHubWidth()+ServoTolerance,StandardServoHubLength()+ServoTolerance,StandardServoHubHeight()+ServoTolerance]);
		}
	}
}



//making the motor
module StandardServoMotor(boltsUp=true, Cylinder=1, hornCentered=false, ServoTolerance=StandardServoTolerance())
{
	if(hornCentered==true){
		if(Cylinder==1){
			translate([-StandardServoThickness()/2,-StandardServoCylinderDist(),-(StandardServoHeight()+StandardServoCylinderHeight())-ServoTolerance*2])
			{
				StandardServoBlock(boltsUp,Cylinder,ServoTolerance);
			}
		}else{
			if(Cylinder==2){
			translate([-StandardServoThickness()/2,-StandardServoCylinderDist(),-(StandardServoHeight()+StandardServoNubHeight())-ServoTolerance*2])
			{
				StandardServoBlock(boltsUp,Cylinder,ServoTolerance);
			}
			}else{
				translate([-StandardServoThickness()/2,-StandardServoCylinderDist(),-(StandardServoHeight()+StandardServoNubHeight())-ServoTolerance*2-horn_height+.5])
				{
					StandardServoBlock(boltsUp,Cylinder,ServoTolerance);
				}
			}
			}
	}else{
		if(boltsUp == true){
			translate([ServoTolerance,(StandardServoLength()-StandardServoBaseLength())/2+ServoTolerance,(-StandardServoHeight()+(StandardServoHeight()-StandardServoWingsDist())-StandardServoWingsHeight()-ServoTolerance*4)])
			{	
				StandardServoBlock(boltsUp,Cylinder,ServoTolerance);
			}
		}else{
			translate([ServoTolerance,(StandardServoLength()-StandardServoBaseLength())/2+ServoTolerance,(-StandardServoHeight()+(StandardServoHeight()-StandardServoWingsDist())-StandardServoWingsHeight()-ServoTolerance*4)])
			{	
				StandardServoBlock(boltsUp,Cylinder,ServoTolerance);
			}
		}
	}

}


///YOU MIGHT WANT TO CLEAN UP THE PRONGEY GUY

//-------------------------------------------
//-- Futaba 3003 4-arm horn
//-------------------------------------------

//-- Futaba 3003 4-arm horn parameters
a4h_end_diam = 5;
a4h_center_diam = 10;
a4h_arm_length = 15;
a4h_drill_distance = 13.3;

horn_drill_diam = 2;
horn_drill_distance = 8;
horn_height = 4;



function horn_height()=4;

module horn4(h=5)
{
  union() {
    //-- Center part (is a square)
    cube([a4h_center_diam+0.2,a4h_center_diam+0.2,h],center=true);

    //-- Place the 4 arms in every side of the cube
    for ( i = [0 : 3] ) {
      rotate( [0,0,i*90])
      translate([0, a4h_center_diam/2, 0])
      horn4_arm(h);
    }
  }
}
module horn4_arm(h=5)
{
  translate([0,a4h_arm_length-a4h_end_diam/2,0])
  //-- The arm consist of the perimeter of a cylinder and a cube
  hull() {
    cylinder(r=a4h_end_diam/2, h=h, center=true, $fn=20);
    translate([0,1-a4h_arm_length+a4h_end_diam/2,0])
      cube([a4h_center_diam,2,h],center=true);
  }
}
module Servo_wheel_4_arm_horn()
{    
      horn4(h= horn_height);
}
//--------------------------------------------------------------
//-- Generic module for the horn's drills
//-- Parameters:
//--  d = drill's radial distance (from the horn's center)
//--  n = number of drills
//--  h = wheel height
//--------------------------------------------------------------
module horn_drills(d,n,h)
{
  union() {
    for ( i = [0 : n-1] ) {
        rotate([0,0,i*360/n])
        translate([0,horn_drill_distance,0])
        cylinder(r=horn_drill_diam/2, h=h+10,center=true, $fn=60);  
      }
  }
}




// StandardServoMotor (boolean,number,boolean, number); 
//The first boolean determines the bolt direction(true is up, false is down, default=true), 
//the first number determines whether to use the large cylindrical hub (1), the small metal nub (2), or the 4-arm horn (3)(default=1). The second boolean determines where the module is centered (true centers at the hub, false centers at the motor mount, default=false). The number indicated the tolerance of the motor (default is .4 mm)

StandardServoMotor(true,1,true,.4);
